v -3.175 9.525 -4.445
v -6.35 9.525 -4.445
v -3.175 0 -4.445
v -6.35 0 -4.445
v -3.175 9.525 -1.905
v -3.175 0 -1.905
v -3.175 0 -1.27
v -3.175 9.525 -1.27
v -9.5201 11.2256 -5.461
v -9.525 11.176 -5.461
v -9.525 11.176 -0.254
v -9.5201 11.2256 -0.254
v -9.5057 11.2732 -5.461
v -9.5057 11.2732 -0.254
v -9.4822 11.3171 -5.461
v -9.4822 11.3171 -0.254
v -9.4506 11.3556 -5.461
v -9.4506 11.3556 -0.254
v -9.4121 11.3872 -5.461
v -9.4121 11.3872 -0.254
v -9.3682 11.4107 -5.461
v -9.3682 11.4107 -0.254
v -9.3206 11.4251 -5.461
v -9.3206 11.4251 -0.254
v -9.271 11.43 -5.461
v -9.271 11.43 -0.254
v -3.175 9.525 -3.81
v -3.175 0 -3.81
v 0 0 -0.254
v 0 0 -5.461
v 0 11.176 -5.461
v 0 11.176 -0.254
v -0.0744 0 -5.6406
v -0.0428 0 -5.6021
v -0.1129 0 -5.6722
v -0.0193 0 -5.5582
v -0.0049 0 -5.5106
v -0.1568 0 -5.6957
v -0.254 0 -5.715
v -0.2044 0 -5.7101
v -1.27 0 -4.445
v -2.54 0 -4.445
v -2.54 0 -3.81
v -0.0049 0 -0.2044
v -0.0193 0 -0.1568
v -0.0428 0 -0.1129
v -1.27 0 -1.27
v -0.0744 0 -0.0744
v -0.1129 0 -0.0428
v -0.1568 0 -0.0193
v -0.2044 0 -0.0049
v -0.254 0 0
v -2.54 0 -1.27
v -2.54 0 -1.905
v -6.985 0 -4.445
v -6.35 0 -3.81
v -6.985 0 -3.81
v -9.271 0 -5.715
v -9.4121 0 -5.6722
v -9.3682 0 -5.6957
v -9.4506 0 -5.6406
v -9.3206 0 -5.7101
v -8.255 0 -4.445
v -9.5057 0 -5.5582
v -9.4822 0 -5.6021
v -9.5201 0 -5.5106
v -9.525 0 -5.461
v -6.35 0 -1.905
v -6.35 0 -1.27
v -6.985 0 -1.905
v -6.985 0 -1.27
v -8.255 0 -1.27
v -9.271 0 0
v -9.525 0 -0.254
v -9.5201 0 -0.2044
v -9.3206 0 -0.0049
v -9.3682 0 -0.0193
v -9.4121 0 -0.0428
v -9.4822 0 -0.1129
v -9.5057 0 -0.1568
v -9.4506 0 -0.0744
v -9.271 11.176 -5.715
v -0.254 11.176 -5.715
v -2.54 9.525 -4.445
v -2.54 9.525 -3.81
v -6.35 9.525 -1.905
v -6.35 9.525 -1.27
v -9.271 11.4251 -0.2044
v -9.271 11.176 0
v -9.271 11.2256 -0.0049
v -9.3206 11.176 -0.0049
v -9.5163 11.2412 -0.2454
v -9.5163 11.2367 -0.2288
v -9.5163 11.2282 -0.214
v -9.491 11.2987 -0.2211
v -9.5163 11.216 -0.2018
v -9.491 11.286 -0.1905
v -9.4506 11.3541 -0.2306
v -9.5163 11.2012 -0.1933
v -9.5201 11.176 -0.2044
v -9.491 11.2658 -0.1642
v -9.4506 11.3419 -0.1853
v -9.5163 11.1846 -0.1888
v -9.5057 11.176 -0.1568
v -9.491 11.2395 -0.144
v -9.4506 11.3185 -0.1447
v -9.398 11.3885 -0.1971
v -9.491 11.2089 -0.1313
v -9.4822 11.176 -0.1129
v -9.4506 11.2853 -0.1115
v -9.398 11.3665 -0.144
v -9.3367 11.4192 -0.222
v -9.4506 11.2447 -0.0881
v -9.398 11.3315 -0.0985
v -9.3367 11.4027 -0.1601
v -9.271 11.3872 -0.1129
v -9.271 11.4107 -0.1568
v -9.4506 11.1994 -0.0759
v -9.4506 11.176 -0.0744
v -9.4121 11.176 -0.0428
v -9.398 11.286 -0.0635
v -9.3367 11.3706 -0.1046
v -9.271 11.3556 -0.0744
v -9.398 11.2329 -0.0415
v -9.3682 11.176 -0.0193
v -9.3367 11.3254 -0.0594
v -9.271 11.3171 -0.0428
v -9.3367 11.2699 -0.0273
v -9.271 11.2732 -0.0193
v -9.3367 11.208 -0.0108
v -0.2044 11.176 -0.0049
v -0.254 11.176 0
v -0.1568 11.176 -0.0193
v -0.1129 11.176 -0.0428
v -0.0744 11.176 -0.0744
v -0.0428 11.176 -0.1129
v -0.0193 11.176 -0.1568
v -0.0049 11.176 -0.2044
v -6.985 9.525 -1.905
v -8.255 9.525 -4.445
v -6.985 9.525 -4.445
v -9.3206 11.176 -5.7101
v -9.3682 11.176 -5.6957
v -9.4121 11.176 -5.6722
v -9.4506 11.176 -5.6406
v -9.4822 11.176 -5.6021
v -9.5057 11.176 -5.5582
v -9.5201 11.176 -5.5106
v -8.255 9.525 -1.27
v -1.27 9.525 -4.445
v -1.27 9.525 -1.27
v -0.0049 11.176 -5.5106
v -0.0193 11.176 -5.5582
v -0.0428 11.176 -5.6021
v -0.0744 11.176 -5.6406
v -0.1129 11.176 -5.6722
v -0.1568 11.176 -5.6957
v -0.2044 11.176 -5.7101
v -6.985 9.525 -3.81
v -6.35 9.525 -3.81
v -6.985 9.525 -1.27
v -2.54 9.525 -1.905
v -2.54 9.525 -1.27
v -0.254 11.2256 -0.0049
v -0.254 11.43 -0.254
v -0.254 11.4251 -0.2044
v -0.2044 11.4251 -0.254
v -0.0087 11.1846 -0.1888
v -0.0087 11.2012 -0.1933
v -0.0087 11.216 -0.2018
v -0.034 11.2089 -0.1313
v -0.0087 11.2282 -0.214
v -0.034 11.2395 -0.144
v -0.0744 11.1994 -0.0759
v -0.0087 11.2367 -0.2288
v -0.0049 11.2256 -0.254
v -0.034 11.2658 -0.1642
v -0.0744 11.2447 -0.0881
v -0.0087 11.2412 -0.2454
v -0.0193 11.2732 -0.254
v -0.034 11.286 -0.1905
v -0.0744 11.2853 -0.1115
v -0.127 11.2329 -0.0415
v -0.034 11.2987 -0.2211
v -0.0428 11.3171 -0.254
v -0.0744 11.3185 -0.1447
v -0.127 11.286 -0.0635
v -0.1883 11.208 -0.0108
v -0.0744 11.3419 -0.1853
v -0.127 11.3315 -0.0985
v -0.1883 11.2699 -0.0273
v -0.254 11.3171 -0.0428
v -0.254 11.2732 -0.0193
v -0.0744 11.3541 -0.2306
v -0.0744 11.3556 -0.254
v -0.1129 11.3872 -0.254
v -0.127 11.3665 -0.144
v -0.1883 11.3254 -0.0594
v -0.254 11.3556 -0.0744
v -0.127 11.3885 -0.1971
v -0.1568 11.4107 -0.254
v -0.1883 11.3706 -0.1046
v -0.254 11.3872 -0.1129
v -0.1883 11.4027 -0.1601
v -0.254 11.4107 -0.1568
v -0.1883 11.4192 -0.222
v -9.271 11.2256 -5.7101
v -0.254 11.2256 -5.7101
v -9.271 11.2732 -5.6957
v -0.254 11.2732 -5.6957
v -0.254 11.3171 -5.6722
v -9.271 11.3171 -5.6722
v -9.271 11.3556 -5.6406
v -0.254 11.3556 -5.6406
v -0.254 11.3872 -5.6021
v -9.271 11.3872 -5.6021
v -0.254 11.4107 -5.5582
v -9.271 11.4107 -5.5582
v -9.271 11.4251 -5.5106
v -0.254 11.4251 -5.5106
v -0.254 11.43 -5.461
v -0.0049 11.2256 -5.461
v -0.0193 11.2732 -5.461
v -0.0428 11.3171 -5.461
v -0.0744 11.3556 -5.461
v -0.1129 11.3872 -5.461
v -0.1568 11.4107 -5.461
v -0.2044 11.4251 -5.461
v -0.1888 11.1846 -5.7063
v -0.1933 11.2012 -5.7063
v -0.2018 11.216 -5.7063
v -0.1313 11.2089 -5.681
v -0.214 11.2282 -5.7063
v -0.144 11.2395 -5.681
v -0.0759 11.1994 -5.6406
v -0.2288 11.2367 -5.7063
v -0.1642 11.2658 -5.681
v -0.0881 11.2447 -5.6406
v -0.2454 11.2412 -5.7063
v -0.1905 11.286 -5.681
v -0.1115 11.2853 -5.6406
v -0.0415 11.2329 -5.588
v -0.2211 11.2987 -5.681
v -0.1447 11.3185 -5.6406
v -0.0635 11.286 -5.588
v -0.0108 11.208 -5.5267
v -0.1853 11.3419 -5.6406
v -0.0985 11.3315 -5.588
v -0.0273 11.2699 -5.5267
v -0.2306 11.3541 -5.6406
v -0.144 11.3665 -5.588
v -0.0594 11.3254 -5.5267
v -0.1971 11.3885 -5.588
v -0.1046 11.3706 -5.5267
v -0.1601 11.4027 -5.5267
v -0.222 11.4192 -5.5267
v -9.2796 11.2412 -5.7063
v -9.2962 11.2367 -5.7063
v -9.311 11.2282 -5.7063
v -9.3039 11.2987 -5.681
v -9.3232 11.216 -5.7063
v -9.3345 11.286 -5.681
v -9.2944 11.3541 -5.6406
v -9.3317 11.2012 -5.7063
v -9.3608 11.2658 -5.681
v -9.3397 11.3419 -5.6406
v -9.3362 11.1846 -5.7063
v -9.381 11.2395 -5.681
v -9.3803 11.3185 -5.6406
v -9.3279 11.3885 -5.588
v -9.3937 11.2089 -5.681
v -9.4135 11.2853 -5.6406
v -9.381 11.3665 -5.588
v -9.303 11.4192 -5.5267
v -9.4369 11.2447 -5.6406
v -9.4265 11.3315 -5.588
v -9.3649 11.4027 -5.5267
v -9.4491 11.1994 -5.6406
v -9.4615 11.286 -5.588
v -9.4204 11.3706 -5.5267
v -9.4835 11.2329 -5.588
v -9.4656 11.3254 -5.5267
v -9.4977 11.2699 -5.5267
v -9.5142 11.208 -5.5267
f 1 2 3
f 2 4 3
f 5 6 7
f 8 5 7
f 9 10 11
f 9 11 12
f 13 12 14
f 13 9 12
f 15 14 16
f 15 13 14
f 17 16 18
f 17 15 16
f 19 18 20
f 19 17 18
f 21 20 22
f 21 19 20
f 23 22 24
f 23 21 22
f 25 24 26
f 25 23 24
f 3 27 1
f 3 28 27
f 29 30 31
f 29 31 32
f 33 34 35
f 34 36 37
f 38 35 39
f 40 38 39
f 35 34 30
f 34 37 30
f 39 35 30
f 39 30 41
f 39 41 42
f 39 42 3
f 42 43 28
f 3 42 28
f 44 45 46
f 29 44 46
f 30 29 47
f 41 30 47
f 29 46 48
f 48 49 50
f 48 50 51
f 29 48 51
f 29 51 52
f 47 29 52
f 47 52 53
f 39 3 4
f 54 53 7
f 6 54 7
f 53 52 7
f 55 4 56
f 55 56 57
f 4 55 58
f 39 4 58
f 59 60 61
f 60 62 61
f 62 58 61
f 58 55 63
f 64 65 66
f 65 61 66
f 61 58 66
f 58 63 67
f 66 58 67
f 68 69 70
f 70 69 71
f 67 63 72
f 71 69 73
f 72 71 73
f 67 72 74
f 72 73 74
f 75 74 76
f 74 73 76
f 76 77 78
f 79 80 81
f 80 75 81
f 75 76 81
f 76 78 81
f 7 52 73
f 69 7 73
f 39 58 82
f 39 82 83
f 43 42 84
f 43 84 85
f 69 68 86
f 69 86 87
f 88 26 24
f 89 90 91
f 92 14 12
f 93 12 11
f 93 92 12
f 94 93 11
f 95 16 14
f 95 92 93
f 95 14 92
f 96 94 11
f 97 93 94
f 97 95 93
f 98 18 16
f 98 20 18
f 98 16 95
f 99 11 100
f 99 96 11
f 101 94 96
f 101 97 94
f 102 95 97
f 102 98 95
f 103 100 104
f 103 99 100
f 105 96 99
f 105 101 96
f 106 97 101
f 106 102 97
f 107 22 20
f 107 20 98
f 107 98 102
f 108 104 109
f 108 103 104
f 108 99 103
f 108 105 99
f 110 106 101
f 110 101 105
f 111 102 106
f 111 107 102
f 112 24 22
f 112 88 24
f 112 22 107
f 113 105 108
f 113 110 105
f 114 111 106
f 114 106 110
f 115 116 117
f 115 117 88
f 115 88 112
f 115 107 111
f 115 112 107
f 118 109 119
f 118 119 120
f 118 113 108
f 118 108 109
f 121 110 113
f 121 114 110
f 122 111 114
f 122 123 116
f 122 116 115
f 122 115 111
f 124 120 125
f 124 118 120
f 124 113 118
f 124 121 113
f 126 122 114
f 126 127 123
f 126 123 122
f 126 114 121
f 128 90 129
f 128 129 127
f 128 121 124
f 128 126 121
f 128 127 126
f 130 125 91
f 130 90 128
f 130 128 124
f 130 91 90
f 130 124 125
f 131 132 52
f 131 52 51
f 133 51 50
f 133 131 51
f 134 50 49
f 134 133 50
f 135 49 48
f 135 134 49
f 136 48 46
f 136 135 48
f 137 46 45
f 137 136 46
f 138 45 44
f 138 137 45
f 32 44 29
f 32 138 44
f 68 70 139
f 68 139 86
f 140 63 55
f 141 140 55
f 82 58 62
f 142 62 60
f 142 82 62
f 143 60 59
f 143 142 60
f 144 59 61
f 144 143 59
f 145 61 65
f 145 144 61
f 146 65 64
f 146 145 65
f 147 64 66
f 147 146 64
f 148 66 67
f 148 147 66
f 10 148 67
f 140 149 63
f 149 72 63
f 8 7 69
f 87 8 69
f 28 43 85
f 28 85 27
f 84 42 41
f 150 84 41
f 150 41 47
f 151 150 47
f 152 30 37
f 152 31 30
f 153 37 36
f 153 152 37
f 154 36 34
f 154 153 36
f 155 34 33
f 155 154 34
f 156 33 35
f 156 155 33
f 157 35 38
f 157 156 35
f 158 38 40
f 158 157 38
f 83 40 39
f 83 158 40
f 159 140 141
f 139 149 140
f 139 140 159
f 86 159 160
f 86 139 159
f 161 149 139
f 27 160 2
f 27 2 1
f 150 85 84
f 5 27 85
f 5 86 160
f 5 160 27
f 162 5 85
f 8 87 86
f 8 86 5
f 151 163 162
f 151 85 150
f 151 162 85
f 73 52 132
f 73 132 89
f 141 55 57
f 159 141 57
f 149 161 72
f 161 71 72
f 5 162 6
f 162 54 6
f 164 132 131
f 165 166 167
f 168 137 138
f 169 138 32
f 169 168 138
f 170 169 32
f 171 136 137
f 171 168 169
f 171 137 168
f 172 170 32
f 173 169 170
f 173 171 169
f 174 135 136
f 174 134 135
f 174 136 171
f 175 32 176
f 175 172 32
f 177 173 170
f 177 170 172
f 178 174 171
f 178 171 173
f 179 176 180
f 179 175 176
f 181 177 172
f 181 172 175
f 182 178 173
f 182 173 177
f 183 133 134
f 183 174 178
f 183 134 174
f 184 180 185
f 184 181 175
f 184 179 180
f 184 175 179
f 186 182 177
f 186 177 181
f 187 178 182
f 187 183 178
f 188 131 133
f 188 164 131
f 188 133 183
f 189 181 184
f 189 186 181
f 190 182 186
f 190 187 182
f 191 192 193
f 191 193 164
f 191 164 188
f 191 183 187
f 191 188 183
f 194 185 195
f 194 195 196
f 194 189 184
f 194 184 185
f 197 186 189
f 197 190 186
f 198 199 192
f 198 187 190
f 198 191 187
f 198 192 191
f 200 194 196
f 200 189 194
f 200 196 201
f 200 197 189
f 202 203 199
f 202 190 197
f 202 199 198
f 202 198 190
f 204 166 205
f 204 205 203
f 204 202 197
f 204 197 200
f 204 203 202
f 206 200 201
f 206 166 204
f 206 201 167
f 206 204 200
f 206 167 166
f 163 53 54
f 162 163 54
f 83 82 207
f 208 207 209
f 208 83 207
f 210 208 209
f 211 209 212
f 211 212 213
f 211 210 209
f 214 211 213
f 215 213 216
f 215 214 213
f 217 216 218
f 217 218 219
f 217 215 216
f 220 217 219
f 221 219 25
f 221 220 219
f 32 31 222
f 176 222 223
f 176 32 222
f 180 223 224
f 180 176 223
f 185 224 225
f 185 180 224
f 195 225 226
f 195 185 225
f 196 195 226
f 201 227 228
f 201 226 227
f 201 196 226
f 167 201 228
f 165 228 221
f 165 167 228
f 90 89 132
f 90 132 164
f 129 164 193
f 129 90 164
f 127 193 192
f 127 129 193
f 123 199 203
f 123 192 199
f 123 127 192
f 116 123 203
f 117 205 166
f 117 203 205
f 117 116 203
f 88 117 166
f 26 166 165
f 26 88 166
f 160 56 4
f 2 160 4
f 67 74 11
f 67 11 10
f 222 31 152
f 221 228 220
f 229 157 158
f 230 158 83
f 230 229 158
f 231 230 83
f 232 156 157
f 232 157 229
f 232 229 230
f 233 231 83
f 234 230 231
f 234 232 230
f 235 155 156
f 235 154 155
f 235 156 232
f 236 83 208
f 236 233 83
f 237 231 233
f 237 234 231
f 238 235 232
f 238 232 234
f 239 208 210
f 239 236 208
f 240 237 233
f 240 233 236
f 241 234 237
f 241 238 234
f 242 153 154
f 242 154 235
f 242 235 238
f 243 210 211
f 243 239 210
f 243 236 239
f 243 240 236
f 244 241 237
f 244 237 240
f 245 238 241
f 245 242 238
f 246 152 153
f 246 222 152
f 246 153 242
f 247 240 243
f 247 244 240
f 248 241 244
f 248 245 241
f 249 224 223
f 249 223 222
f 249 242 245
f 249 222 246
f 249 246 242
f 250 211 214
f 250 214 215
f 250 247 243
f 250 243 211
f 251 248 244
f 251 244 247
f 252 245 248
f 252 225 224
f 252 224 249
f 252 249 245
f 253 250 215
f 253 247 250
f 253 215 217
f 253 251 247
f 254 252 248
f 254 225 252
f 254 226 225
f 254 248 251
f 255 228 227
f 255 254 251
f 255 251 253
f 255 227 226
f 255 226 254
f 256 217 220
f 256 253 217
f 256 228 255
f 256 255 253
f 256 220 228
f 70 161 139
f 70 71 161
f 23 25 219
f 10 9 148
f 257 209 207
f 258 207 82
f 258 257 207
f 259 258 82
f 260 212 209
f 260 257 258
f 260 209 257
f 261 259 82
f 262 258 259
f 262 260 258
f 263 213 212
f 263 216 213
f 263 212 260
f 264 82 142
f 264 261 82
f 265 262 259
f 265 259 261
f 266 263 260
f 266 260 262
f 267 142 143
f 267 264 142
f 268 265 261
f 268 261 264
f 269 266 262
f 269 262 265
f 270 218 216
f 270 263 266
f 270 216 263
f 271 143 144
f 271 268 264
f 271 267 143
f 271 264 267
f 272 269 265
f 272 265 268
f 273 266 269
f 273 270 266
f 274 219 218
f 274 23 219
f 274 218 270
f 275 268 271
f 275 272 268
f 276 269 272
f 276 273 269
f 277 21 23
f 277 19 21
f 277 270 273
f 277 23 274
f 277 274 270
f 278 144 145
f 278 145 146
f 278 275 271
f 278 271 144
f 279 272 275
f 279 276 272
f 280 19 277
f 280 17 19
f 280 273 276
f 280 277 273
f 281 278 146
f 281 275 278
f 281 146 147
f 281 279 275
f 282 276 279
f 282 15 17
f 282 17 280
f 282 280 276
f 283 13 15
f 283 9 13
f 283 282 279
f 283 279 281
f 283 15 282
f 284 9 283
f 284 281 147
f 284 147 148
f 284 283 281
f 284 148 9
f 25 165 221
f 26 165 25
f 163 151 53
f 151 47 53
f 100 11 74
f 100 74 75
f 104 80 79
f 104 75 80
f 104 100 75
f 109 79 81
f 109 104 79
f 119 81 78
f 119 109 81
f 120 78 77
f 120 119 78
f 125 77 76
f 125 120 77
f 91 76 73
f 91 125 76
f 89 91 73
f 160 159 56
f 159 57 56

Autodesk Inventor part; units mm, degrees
ref_plane "YZ Plane" through (0, 0, 0) normal (1, 0, 0) x (0, 1, 0)
ref_plane "XZ Plane" through (0, 0, 0) normal (0, 1, 0) x (-1, 0, 0)
ref_plane "XY Plane" through (0, 0, 0) normal (0, 0, 1) x (1, 0, 0)
sketch "Náčrt1" plane through (0, 0, 0) normal (0, 1, 0) x (-1, 0, 0)
  line L0 (0, 0) -> (9.525, 0)
  line L1 (9.525, 0) -> (9.525, -5.715)
  line L2 (9.525, -5.715) -> (0, -5.715)
  line L3 (0, -5.715) -> (0, 0)
  dimension "d0" = 9.525
  dimension "d1" = 5.715
extrude "Vysunutí1" add sketch "Náčrt1" along normal blind 11.43
sketch "Náčrt2" plane through (0, 0, 0) normal (0, -1, 0) x (1, 0, 0)
  line L0 (-1.27, -4.445) -> (-1.27, -1.27)
  line L1 (-8.255, -1.27) -> (-8.255, -4.445)
  line L2 (-6.35, -4.445) -> (-3.175, -4.445)
  line L3 (-3.175, -1.27) -> (-6.35, -1.27)
  line L4 (-2.54, -1.27) -> (-2.54, -1.905)
  line L5 (-2.54, -1.905) -> (-3.175, -1.905)
  line L6 (-3.175, -1.905) -> (-3.175, -1.27)
  line L7 (-2.54, -4.445) -> (-2.54, -3.81)
  line L8 (-2.54, -3.81) -> (-3.175, -3.81)
  line L9 (-3.175, -3.81) -> (-3.175, -4.445)
  line L10 (-6.985, -4.445) -> (-6.985, -3.81)
  line L11 (-6.985, -3.81) -> (-6.35, -3.81)
  line L12 (-6.35, -3.81) -> (-6.35, -4.445)
  line L13 (-6.985, -1.27) -> (-6.985, -1.905)
  line L14 (-6.985, -1.905) -> (-6.35, -1.905)
  line L15 (-6.35, -1.905) -> (-6.35, -1.27)
  line L16 (-6.985, -1.27) -> (-8.255, -1.27)
  line L17 (-8.255, -4.445) -> (-6.985, -4.445)
  line L18 (-6.35, -4.445) -> (-3.175, -4.445)
  line L19 (-2.54, -4.445) -> (-1.27, -4.445)
  line L20 (-1.27, -1.27) -> (-2.54, -1.27)
  line L21 (-3.175, -1.27) -> (-6.35, -1.27)
  point P0 (-4.7625, -2.8575)
extrude "Vysunutí2" cut sketch "Náčrt2" against normal blind 9.525
fillet "Zaoblení1" radius 0.254 8 edges at (-4.7625, 11.43, 0) (-9.525, 5.715, 0) (-9.525, 11.43, -2.8575) (0, 11.43, -2.8575) (-4.7625, 11.43, -5.715) (-9.525, 5.715, -5.715) (0, 5.715, 0) (0, 5.715, -5.715)
properties part number "Button"
